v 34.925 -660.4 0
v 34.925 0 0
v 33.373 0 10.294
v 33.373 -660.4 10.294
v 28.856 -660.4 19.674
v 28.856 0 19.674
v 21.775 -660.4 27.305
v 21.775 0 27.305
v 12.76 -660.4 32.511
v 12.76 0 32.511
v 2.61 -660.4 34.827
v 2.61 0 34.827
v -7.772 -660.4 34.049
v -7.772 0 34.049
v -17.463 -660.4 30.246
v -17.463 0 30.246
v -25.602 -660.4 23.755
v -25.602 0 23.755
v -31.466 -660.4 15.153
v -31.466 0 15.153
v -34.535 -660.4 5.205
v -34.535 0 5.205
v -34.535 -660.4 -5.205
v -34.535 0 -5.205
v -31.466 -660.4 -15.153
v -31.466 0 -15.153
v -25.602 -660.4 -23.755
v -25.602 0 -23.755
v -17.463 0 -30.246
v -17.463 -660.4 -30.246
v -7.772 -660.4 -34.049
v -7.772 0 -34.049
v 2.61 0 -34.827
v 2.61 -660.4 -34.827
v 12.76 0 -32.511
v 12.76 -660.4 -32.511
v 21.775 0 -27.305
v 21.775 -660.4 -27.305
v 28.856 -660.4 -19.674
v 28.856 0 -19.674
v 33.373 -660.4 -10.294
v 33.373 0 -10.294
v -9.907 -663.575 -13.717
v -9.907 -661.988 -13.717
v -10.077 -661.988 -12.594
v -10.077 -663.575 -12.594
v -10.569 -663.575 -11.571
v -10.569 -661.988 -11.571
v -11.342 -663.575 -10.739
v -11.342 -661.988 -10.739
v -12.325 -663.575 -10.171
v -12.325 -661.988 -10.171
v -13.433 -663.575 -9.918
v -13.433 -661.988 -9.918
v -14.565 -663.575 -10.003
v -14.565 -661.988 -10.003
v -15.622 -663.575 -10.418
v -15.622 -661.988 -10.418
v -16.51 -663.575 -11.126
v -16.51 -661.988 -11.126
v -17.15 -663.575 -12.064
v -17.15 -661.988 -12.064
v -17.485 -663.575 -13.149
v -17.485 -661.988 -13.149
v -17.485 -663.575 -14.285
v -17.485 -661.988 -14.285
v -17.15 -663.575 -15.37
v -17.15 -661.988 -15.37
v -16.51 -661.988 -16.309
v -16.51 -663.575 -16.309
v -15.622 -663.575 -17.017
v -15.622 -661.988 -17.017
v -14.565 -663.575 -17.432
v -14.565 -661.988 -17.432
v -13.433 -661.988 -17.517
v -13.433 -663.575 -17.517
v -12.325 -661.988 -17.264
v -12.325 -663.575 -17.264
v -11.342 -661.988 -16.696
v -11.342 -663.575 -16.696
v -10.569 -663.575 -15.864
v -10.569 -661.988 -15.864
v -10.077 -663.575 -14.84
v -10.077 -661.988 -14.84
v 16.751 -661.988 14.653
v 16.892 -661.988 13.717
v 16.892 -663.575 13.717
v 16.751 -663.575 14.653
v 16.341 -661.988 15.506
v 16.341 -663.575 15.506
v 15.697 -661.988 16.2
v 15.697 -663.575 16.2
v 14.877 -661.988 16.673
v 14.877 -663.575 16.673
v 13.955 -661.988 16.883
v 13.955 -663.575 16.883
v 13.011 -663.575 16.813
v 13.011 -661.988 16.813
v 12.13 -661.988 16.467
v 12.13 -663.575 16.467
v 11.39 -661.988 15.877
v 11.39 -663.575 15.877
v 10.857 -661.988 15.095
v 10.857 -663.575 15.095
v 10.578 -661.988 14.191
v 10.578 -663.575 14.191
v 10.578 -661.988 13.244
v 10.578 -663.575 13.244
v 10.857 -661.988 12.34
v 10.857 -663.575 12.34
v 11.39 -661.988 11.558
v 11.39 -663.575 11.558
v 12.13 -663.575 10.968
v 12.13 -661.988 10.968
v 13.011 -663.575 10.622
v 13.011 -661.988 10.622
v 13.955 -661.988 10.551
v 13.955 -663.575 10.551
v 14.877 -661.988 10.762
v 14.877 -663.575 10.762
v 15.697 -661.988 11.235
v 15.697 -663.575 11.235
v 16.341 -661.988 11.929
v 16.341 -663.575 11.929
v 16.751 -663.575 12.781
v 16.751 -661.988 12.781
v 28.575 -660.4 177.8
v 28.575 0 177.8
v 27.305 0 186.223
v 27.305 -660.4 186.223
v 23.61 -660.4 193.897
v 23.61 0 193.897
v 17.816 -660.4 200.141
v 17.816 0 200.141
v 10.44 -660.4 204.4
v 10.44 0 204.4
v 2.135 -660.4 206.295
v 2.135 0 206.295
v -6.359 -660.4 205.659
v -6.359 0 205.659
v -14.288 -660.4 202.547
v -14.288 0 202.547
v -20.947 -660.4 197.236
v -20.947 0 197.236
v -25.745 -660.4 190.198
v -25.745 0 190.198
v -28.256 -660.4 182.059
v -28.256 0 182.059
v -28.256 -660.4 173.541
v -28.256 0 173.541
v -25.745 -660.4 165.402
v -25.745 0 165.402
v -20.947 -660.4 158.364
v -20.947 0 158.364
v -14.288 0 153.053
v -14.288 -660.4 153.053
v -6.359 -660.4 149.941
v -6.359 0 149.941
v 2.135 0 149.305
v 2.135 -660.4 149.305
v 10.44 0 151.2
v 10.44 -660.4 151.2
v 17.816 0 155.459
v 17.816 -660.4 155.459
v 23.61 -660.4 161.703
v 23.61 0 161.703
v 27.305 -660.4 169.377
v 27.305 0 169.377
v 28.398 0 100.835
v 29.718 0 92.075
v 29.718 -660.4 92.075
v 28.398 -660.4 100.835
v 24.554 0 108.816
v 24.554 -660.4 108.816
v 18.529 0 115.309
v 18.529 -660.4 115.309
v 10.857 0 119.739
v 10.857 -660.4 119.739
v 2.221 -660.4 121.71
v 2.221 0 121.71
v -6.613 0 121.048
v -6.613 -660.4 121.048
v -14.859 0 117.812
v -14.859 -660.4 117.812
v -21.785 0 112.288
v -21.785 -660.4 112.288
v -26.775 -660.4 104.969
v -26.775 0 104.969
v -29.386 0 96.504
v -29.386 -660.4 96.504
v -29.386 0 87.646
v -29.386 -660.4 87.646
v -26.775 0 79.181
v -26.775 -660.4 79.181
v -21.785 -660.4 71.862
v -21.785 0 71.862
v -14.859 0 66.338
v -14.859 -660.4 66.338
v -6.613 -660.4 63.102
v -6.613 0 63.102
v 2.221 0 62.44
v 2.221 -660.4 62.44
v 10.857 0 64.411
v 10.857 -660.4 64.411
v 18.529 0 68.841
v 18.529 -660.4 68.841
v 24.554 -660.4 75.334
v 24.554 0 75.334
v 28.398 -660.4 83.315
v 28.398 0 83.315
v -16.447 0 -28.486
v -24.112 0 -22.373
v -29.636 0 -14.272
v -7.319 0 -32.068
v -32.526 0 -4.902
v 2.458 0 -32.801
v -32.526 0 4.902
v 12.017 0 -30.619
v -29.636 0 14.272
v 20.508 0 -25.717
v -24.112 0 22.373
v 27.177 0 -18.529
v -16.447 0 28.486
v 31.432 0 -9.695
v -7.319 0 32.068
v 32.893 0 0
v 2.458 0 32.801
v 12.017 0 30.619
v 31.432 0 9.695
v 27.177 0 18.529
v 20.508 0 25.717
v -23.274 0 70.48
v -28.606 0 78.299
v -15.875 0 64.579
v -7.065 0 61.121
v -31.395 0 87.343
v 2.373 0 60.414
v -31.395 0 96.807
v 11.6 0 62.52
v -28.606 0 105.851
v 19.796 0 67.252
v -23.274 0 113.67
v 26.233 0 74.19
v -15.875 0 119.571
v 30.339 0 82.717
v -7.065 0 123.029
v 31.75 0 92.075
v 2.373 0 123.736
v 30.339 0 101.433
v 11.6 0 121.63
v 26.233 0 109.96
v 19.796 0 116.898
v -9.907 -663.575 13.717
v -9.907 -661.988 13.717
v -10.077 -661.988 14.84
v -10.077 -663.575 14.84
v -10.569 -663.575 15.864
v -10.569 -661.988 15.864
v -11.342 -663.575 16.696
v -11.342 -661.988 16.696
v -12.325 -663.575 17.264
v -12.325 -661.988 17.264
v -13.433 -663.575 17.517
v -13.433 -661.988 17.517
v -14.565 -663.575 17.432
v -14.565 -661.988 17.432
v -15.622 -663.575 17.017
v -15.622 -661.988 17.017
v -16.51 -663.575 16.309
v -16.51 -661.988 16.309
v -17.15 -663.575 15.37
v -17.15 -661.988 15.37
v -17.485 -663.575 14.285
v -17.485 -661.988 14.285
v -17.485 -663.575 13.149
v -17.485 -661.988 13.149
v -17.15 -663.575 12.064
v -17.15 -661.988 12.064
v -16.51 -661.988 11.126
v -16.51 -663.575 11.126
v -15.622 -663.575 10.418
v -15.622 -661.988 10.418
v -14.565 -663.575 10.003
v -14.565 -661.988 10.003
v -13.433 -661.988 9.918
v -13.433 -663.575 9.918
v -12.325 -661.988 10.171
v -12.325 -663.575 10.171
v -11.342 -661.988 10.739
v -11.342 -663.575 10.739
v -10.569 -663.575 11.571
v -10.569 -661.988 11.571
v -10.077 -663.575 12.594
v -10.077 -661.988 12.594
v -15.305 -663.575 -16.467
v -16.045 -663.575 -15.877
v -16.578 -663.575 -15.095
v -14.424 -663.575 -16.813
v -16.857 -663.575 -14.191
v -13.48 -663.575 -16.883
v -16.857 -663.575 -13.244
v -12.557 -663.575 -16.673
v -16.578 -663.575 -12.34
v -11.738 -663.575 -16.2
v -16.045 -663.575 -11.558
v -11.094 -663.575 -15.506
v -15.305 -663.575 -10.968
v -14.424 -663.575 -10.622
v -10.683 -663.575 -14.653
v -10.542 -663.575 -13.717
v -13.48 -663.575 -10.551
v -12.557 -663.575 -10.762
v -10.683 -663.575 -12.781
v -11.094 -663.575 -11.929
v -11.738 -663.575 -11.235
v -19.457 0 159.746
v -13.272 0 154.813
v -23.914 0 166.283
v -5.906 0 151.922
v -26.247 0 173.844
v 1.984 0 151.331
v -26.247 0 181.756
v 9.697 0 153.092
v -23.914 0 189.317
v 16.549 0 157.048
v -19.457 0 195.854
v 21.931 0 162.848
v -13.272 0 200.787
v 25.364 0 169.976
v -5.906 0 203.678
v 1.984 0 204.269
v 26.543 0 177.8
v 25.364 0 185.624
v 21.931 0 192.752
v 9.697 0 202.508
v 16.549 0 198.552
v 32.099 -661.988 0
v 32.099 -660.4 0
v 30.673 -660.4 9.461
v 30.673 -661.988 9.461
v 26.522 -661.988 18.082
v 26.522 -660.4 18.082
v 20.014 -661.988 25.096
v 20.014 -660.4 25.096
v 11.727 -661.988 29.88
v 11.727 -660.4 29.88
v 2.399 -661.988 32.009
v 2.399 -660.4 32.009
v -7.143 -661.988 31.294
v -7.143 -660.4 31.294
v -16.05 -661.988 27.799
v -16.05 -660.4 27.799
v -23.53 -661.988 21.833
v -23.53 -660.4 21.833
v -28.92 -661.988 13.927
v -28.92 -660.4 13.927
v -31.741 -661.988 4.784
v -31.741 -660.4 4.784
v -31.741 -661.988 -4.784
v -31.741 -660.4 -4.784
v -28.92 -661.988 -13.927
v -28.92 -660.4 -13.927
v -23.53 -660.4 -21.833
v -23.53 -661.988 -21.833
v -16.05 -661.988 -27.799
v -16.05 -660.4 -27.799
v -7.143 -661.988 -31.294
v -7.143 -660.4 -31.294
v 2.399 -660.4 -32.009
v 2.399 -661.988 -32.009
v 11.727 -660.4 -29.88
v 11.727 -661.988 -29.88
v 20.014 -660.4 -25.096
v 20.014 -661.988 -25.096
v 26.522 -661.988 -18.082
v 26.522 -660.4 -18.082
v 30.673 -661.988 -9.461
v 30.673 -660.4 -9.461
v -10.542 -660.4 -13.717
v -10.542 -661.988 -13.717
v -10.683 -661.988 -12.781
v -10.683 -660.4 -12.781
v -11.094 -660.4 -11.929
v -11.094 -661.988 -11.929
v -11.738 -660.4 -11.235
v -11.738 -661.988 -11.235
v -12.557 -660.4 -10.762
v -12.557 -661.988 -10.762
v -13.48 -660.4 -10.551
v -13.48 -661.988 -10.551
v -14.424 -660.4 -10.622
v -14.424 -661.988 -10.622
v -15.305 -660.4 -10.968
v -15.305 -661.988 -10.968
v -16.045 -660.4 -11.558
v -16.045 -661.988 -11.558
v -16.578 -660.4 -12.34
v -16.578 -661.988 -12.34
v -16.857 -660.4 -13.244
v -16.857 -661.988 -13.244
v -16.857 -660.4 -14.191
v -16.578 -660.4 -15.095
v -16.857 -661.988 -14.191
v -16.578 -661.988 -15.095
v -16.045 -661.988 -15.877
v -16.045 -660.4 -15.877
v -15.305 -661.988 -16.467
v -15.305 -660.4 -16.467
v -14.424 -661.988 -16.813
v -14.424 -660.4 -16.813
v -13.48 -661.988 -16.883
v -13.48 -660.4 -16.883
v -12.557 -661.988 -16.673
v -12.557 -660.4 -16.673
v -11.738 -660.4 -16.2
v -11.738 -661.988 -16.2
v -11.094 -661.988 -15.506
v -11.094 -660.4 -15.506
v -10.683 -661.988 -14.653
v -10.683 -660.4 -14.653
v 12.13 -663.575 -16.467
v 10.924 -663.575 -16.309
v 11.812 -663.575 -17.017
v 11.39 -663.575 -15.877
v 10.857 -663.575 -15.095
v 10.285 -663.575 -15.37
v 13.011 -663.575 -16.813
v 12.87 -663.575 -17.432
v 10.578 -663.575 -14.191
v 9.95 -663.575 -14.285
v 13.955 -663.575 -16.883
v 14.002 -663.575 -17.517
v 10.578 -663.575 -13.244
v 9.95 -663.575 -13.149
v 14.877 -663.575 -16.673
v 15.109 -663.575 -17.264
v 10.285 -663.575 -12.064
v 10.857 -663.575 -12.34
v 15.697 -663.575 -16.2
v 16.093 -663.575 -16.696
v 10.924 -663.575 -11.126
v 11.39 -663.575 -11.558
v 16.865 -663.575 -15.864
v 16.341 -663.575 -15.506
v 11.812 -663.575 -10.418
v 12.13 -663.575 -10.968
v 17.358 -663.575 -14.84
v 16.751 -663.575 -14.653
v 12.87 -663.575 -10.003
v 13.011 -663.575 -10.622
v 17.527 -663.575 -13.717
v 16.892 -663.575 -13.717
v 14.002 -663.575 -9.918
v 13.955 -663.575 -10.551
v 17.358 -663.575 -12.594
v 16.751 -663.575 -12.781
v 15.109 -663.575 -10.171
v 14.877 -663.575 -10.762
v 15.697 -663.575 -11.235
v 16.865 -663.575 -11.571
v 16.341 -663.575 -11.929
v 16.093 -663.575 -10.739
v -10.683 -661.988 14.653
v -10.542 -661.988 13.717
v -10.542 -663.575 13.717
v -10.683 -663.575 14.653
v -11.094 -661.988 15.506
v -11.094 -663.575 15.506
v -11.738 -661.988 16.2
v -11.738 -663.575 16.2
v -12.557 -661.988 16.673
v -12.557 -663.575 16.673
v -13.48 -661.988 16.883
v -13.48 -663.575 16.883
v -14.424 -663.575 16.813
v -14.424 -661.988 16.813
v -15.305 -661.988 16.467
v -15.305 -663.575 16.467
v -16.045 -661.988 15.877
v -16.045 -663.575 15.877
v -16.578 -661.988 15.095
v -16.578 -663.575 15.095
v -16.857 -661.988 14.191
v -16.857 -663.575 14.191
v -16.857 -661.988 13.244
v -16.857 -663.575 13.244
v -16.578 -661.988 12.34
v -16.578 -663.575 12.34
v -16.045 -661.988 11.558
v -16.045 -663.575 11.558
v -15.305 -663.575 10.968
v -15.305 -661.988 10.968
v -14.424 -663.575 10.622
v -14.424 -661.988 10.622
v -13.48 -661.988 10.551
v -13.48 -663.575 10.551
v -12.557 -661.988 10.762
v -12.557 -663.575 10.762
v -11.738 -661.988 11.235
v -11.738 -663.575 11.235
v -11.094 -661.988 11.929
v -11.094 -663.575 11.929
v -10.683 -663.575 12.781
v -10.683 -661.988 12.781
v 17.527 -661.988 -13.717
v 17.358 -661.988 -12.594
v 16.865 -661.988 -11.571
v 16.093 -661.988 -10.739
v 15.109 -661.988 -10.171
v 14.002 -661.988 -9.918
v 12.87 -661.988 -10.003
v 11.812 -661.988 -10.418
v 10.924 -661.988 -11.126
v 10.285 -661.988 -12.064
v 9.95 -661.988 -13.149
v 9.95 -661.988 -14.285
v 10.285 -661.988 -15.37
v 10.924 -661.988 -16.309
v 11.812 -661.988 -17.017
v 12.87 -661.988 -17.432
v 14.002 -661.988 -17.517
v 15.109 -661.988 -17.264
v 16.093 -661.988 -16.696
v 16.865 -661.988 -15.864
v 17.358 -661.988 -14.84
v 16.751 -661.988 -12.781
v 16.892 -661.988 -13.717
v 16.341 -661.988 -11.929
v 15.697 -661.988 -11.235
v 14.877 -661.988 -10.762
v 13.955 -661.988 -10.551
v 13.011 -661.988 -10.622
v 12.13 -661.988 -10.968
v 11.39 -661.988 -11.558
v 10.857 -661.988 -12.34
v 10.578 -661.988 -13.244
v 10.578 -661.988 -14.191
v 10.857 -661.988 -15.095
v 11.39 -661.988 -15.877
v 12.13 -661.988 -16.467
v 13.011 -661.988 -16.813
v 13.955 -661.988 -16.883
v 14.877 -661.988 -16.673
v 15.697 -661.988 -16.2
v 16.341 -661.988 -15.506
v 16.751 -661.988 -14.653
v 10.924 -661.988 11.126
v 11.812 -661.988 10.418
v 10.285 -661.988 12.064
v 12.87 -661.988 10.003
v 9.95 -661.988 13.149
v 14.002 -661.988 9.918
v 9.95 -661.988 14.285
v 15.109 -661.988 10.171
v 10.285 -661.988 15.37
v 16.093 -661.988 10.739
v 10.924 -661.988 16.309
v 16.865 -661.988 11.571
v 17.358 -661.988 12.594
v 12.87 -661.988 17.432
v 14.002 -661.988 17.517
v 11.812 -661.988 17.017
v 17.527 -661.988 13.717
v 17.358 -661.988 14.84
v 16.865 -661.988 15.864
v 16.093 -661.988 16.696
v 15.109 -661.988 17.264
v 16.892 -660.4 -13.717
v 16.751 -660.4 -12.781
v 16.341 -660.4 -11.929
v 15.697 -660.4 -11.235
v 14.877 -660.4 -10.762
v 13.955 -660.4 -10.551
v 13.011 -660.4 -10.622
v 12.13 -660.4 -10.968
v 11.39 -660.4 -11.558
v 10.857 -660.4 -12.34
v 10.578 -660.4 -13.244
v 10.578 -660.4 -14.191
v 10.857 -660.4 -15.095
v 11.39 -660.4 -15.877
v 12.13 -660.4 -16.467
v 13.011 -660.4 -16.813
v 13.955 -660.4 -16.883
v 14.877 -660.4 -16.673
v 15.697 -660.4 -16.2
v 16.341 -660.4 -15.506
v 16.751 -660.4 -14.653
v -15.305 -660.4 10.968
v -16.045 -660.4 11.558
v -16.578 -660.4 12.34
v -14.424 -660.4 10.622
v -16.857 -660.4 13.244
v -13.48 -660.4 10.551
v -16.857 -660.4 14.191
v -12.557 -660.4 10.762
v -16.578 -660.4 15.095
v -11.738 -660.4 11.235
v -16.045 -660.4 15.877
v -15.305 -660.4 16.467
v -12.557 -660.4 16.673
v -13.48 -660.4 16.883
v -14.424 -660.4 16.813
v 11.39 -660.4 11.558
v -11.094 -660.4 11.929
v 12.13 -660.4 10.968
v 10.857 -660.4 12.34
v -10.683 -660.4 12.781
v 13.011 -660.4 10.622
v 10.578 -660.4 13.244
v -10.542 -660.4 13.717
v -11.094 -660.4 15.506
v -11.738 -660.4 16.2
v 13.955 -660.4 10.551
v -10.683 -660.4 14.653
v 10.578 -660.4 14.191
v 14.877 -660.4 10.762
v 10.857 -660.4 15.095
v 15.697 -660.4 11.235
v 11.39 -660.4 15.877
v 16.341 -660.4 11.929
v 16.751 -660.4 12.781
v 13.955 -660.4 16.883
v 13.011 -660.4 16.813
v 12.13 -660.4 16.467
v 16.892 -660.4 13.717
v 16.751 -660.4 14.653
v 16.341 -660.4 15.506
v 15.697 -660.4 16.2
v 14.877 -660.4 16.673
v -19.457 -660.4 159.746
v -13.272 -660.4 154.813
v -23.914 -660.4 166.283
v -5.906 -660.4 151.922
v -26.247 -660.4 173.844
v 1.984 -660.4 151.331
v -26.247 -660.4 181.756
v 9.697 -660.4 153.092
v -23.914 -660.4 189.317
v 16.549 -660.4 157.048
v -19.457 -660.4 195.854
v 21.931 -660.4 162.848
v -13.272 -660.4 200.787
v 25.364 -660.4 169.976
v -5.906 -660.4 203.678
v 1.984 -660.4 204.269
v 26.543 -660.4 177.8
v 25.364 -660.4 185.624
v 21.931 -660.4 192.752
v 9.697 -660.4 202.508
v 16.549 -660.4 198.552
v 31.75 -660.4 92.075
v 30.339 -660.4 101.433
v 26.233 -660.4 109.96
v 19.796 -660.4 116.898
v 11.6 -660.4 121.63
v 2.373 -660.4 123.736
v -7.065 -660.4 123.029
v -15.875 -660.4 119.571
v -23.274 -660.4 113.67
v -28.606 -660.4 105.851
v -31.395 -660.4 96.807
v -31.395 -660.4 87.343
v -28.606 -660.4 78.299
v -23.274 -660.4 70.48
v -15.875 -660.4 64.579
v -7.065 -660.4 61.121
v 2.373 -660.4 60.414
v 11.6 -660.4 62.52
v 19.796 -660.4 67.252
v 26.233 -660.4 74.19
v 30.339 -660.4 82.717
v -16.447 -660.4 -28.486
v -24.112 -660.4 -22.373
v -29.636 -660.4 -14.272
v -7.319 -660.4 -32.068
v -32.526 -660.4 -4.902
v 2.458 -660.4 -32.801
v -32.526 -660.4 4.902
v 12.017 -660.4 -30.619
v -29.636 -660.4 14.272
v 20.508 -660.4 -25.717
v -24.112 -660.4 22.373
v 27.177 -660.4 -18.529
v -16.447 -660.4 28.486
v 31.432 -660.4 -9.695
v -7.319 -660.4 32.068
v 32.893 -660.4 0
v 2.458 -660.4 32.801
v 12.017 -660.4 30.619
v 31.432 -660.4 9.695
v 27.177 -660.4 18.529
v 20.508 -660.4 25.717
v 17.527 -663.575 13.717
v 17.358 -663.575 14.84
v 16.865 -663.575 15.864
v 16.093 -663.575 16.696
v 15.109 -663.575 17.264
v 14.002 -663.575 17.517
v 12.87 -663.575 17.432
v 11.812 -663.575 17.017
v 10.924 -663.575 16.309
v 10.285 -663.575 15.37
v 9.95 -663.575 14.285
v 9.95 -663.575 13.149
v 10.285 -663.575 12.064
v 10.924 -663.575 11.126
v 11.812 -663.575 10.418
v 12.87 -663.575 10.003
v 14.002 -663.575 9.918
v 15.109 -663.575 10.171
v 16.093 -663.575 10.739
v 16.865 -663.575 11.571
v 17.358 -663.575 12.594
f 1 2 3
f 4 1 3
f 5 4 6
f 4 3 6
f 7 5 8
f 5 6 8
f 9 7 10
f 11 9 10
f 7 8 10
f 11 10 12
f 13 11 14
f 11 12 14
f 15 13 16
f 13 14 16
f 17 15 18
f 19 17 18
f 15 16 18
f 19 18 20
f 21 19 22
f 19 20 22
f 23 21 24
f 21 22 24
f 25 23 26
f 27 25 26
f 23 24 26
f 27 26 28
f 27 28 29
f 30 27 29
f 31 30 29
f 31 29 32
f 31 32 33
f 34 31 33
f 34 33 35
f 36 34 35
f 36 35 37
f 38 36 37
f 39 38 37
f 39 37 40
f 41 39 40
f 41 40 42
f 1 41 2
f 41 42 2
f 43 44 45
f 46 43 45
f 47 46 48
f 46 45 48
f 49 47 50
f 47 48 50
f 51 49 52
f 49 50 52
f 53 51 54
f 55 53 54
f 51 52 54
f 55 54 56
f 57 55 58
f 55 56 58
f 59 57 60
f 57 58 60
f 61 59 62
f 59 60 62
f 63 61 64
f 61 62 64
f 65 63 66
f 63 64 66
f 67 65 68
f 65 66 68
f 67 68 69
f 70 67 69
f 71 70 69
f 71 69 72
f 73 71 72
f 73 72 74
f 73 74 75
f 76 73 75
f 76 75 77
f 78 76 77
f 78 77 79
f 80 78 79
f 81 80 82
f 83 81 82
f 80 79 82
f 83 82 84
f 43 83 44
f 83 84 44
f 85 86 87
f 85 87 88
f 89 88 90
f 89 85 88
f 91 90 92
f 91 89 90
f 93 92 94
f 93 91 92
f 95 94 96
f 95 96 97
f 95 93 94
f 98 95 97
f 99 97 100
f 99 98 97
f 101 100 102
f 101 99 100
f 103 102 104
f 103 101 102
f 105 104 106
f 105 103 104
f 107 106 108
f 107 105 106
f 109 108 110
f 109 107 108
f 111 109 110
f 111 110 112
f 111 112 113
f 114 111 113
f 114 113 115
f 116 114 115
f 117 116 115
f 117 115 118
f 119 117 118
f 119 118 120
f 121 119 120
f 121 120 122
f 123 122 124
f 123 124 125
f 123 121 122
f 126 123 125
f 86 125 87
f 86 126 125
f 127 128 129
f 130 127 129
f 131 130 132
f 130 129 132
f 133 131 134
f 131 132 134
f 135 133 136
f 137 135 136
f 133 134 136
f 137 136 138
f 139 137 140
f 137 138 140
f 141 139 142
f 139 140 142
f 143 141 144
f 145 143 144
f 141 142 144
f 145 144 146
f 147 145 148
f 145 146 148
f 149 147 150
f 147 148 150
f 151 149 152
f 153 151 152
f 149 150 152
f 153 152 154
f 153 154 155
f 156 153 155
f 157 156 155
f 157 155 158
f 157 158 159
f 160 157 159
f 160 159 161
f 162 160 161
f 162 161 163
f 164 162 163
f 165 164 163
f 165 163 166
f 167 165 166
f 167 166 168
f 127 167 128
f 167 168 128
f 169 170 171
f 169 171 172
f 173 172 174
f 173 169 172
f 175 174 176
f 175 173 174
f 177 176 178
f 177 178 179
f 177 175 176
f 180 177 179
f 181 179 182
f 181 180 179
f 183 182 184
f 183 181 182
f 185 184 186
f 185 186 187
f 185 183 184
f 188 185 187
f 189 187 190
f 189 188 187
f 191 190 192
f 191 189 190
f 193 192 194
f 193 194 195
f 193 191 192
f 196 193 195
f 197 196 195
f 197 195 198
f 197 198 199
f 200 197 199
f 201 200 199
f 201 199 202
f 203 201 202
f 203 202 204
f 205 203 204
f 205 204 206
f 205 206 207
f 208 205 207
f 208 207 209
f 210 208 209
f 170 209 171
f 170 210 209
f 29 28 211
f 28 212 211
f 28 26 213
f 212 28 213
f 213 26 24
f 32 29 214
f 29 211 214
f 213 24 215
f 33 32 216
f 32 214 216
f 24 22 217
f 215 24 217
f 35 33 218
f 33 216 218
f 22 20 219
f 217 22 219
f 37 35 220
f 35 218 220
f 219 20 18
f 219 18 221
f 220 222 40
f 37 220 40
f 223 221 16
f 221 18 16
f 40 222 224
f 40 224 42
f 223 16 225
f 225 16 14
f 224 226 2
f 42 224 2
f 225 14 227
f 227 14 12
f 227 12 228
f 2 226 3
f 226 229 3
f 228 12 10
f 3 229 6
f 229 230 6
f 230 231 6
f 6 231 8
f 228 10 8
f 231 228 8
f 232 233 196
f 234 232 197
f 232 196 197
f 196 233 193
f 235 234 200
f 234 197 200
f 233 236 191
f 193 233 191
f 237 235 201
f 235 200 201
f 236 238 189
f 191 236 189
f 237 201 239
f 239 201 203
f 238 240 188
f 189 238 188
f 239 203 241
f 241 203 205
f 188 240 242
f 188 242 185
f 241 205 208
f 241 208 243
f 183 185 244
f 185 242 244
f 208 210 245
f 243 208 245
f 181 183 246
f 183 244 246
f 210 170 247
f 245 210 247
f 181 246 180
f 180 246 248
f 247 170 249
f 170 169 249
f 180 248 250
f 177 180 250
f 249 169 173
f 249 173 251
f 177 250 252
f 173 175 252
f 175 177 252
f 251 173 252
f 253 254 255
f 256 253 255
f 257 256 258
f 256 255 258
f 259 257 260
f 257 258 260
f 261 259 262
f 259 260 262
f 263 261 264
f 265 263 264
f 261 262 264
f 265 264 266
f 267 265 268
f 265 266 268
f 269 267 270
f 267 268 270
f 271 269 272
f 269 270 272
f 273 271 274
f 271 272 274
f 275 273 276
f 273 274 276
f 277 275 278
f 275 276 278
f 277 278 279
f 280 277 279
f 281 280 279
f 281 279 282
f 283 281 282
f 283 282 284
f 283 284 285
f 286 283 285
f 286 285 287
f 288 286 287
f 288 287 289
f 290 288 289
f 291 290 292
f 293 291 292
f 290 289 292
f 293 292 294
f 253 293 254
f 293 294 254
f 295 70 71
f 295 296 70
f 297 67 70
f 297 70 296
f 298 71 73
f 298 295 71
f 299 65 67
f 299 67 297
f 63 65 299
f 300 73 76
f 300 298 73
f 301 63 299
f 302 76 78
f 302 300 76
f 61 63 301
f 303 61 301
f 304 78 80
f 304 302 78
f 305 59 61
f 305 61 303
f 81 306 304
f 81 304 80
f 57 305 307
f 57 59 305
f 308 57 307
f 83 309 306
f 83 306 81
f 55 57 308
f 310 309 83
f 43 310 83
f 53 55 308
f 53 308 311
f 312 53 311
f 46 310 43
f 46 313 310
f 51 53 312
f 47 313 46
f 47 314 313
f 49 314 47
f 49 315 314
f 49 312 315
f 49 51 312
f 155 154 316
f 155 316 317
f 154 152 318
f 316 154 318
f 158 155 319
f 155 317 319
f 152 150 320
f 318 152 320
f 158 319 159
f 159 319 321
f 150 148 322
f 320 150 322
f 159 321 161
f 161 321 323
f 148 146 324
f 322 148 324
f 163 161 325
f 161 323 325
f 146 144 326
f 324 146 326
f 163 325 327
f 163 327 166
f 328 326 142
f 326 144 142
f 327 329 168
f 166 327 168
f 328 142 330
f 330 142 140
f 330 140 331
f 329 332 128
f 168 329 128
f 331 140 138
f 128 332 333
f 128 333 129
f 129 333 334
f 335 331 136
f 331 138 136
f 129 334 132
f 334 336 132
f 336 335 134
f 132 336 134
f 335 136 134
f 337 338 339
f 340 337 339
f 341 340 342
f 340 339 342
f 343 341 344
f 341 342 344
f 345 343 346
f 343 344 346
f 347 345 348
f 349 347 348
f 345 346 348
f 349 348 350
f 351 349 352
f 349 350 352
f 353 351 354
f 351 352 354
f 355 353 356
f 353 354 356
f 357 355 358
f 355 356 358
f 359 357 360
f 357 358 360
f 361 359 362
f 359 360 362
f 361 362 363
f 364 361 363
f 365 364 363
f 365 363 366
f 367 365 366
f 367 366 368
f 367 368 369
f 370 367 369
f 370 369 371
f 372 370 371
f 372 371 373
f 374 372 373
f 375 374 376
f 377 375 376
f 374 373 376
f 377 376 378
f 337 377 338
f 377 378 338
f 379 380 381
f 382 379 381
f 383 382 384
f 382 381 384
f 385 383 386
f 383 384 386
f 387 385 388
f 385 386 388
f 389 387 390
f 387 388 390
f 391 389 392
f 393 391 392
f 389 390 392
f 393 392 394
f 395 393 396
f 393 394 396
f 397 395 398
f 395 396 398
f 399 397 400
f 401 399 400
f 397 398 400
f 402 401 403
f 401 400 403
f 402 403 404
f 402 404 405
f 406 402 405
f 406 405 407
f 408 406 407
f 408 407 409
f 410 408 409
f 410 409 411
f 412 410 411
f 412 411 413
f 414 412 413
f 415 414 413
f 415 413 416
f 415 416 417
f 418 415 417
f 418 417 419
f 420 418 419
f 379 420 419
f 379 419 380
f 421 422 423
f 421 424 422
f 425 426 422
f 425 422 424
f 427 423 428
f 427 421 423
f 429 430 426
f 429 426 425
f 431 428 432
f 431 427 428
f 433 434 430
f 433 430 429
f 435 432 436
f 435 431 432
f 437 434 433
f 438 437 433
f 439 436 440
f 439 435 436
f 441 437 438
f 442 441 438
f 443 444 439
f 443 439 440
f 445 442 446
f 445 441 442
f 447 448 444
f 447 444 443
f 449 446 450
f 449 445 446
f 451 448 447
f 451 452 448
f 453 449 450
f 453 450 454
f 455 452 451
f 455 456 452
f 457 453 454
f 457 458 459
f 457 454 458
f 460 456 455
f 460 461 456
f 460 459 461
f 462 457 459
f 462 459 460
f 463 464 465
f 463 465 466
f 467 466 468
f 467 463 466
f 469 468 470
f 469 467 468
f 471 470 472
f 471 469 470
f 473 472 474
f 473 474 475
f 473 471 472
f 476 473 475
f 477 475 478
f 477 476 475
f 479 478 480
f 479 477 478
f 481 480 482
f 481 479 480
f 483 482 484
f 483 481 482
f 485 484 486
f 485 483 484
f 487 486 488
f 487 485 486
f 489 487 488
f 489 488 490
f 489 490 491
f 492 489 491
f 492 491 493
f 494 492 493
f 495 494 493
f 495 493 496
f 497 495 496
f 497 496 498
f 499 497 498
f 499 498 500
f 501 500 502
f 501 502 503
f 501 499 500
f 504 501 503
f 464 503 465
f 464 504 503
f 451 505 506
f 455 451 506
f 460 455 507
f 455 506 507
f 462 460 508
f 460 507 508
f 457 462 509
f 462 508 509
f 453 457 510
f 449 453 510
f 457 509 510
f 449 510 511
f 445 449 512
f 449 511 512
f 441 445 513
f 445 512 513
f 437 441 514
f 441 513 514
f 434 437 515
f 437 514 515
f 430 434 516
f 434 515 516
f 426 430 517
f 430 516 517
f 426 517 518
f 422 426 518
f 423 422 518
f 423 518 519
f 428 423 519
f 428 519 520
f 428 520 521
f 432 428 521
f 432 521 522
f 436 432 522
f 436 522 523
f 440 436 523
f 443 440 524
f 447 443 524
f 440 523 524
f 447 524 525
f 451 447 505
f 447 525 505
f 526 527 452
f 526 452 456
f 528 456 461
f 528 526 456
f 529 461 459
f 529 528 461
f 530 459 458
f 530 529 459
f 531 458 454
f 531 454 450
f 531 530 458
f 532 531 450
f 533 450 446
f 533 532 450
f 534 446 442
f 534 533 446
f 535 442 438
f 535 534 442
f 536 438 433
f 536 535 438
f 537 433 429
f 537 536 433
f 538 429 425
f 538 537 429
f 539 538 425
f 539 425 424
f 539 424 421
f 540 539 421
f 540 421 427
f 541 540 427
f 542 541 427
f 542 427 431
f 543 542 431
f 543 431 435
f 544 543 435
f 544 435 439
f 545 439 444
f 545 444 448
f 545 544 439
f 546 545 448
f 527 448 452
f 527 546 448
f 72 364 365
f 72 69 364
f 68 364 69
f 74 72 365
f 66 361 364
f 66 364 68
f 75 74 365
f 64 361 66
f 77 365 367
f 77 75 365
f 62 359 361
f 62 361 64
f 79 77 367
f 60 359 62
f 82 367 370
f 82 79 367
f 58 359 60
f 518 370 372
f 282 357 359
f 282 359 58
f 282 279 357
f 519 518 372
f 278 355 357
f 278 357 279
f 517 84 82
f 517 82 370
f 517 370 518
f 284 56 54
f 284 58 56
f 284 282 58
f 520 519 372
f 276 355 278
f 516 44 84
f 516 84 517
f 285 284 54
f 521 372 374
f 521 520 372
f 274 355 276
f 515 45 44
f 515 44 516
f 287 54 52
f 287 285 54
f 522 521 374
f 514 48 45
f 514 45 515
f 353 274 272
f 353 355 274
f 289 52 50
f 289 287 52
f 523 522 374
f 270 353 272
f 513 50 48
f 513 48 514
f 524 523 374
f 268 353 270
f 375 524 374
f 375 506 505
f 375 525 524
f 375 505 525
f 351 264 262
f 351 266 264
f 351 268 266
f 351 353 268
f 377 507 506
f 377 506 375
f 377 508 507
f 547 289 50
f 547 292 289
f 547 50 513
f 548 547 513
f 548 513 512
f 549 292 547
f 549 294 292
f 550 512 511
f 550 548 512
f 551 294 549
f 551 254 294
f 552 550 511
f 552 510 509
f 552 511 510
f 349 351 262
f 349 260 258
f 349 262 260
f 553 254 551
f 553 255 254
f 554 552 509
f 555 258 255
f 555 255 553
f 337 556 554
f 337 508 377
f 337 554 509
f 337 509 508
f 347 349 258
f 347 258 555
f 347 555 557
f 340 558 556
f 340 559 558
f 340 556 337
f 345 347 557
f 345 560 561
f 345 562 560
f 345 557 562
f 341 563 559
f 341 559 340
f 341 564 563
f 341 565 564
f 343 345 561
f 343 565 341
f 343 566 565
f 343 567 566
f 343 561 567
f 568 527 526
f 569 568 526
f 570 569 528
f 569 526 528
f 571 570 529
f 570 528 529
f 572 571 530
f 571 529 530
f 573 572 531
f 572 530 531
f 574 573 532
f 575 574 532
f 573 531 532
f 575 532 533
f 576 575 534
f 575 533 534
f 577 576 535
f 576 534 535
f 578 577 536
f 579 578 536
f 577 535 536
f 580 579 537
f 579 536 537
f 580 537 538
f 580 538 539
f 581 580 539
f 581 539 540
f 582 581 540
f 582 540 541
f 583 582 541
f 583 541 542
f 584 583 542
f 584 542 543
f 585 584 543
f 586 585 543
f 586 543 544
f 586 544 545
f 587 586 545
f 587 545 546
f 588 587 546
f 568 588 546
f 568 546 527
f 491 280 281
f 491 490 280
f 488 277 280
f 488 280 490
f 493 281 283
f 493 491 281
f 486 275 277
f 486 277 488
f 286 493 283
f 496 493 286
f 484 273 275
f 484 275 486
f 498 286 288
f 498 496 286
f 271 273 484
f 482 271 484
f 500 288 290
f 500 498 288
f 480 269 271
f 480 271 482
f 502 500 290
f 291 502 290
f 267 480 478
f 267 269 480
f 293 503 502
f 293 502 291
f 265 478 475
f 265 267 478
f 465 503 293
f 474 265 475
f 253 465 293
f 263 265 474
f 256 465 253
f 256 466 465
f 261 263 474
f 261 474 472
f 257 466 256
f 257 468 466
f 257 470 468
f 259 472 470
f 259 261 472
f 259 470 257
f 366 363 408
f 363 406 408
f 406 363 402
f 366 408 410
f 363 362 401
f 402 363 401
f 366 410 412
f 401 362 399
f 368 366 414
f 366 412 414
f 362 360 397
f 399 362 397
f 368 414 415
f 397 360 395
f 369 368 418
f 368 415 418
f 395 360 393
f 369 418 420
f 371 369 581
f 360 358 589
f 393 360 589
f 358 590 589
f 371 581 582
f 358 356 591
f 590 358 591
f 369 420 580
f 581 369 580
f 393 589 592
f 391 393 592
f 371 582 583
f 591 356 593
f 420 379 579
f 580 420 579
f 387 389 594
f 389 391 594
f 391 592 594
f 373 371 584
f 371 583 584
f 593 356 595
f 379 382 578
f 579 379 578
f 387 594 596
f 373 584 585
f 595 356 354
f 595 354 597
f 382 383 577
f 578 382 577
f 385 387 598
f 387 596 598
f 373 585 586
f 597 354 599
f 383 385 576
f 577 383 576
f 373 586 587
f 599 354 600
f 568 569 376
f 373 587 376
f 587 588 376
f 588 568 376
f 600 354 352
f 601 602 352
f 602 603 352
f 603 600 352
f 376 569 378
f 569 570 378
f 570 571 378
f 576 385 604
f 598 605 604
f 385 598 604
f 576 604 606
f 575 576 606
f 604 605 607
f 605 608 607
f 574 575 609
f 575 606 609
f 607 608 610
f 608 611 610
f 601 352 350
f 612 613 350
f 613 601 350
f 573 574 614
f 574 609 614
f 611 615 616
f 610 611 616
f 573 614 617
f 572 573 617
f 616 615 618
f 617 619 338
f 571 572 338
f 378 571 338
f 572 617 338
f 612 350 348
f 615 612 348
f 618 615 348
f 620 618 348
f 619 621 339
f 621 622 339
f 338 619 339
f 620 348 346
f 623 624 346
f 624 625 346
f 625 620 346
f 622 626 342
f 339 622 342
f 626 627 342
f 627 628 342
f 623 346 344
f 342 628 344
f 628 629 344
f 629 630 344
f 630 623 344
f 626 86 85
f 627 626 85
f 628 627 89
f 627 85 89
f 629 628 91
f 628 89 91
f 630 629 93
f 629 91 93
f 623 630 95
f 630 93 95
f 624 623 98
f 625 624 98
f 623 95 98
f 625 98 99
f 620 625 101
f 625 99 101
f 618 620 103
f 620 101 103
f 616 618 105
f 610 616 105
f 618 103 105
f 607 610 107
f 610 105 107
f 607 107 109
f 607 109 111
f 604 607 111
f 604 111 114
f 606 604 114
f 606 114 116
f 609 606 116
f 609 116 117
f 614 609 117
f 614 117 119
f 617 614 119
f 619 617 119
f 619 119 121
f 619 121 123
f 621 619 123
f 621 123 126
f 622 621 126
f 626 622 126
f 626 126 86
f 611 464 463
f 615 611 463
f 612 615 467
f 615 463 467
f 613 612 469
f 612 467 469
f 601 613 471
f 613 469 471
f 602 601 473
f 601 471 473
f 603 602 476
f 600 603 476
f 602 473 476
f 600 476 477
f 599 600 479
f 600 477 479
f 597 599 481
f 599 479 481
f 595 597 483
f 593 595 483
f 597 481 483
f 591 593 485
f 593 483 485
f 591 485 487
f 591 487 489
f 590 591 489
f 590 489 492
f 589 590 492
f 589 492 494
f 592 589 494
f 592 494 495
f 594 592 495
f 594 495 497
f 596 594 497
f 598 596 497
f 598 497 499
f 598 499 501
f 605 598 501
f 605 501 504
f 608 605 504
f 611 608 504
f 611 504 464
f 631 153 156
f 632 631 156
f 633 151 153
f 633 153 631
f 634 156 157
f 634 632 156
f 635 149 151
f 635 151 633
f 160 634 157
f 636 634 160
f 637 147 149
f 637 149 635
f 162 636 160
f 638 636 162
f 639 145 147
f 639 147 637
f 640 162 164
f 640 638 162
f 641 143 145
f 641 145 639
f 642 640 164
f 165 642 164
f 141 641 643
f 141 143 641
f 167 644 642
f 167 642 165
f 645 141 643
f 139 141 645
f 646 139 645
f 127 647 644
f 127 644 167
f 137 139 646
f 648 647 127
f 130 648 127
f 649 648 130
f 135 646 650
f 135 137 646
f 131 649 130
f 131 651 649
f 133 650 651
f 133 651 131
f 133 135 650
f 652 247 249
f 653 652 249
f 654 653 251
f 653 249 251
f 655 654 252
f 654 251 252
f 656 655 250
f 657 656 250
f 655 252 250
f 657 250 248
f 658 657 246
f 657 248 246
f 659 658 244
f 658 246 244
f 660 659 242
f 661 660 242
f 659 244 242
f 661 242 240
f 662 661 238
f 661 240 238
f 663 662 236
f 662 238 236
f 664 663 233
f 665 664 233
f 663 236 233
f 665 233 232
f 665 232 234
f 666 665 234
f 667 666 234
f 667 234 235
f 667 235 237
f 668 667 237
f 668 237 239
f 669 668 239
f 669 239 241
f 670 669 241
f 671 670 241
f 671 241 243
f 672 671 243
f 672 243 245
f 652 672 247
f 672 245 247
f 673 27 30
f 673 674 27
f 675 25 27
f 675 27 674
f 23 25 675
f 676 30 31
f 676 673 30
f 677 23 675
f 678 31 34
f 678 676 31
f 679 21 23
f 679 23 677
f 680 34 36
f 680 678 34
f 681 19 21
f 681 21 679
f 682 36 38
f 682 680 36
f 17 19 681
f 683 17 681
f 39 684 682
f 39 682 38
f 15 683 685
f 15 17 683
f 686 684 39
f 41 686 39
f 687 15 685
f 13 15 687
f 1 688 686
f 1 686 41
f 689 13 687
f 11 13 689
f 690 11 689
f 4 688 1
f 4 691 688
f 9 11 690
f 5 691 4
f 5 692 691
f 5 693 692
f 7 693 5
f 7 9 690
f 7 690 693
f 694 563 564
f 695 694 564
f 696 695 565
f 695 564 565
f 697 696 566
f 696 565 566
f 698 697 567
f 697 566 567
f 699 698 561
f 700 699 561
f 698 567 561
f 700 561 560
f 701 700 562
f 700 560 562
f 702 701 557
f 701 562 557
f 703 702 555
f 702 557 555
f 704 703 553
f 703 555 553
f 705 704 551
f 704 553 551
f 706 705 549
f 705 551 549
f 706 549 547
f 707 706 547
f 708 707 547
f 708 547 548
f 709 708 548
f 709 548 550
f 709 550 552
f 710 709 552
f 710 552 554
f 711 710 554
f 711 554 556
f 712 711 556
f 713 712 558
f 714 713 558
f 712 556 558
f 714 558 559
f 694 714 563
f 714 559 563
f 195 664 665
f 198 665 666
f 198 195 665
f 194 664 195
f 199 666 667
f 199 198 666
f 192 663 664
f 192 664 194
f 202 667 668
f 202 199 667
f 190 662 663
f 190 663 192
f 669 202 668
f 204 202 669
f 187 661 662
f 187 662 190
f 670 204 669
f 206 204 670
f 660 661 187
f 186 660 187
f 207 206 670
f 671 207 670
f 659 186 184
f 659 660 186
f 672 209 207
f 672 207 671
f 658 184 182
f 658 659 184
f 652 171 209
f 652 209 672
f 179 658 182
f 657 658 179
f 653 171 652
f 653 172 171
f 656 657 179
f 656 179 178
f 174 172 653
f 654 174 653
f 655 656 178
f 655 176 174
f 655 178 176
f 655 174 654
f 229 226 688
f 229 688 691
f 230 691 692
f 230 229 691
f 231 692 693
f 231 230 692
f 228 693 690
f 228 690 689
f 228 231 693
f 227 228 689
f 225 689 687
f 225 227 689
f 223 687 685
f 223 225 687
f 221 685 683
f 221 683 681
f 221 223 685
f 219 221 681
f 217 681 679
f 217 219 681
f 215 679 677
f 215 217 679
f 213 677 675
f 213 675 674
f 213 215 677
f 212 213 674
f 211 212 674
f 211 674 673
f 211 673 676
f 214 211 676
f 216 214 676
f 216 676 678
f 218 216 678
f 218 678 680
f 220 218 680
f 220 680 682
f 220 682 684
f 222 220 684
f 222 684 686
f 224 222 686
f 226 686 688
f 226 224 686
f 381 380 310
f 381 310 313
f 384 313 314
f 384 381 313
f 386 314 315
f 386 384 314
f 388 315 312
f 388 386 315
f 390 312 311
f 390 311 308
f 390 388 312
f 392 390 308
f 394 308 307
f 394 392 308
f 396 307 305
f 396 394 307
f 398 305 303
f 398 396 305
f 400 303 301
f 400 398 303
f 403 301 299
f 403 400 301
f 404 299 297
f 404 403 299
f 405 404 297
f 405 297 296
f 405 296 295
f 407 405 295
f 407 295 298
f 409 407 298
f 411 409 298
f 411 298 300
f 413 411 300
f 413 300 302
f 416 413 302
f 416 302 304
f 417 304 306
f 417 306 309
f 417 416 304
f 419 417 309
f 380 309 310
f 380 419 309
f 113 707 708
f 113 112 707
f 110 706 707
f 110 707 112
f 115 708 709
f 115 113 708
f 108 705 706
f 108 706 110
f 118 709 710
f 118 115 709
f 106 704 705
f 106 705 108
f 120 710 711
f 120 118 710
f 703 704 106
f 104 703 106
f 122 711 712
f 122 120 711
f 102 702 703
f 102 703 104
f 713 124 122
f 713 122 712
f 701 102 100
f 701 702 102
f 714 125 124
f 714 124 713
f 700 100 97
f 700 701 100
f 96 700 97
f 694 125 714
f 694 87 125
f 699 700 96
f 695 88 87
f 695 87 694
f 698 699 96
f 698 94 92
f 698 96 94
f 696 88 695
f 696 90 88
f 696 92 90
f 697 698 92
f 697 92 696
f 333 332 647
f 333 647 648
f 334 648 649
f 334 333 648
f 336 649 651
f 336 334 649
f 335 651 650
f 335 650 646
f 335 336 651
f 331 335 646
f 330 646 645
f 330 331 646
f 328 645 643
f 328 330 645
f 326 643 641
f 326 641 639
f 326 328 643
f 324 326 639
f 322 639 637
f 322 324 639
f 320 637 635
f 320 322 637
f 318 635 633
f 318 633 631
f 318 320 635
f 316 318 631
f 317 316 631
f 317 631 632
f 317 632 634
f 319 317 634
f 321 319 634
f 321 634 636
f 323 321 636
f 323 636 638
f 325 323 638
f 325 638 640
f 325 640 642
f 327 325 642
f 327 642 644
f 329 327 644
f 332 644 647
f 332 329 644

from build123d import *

# Parameters (mm, degrees)
F0_R     = 28.575
F0_R_2   = 26.543
F0_R_3   = 31.75
F0_R_4   = 29.718
F0_R_5   = 34.925
F0_R_6   = 32.893
F1_DEPTH = 660.4
F2_R     = 32.09925
F3_DEPTH = 1.5875
F4_R     = 3.81
F4_R_2   = 3.175
F5_DEPTH = 1.5875
F6_DEPTH = 661.9885


with BuildPart() as f1:
    # F0 (on Front) → F1 (new body)
    with BuildSketch(Plane.XZ):
        with Locations((0, 177.8)):
            Circle(F0_R)
        with Locations((0, 177.8)):
            Circle(F0_R_2, mode=Mode.SUBTRACT)
        with Locations((0, 92.075)):
            Circle(F0_R_3)
        with Locations((0, 92.075)):
            Circle(F0_R_4, mode=Mode.SUBTRACT)
        Circle(F0_R_5)
        Circle(F0_R_6, mode=Mode.SUBTRACT)
    extrude(amount=F1_DEPTH)


with BuildPart() as f3:
    # F2 (on face) → F3 (new body)
    with BuildSketch(Plane.XZ.offset(660.4)):
        Circle(F2_R)
    extrude(amount=F3_DEPTH)

    # F4 (on face) → F5 (join)
    with BuildSketch(Plane.XZ.offset(661.9875)):
        with Locations((-13.717341, 13.717341)):
            Circle(F4_R)
        with Locations((-13.717341, 13.717341)):
            Circle(F4_R_2, mode=Mode.SUBTRACT)
        with Locations((13.717341, 13.717341)):
            Circle(F4_R)
        with Locations((13.717341, 13.717341)):
            Circle(F4_R_2, mode=Mode.SUBTRACT)
        with Locations((13.717341, -13.717341)):
            Circle(F4_R)
        with Locations((13.717341, -13.717341)):
            Circle(F4_R_2, mode=Mode.SUBTRACT)
        with Locations((-13.717341, -13.717341)):
            Circle(F4_R)
        with Locations((-13.717341, -13.717341)):
            Circle(F4_R_2, mode=Mode.SUBTRACT)
    extrude(amount=F5_DEPTH)

    # F4 (on face) → F6 (cut, through all)
    with BuildSketch(Plane.XZ.offset(661.9875)):
        with Locations((-13.717341, 13.717341)):
            Circle(F4_R_2)
        with Locations((13.717341, 13.717341)):
            Circle(F4_R_2)
        with Locations((13.717341, -13.717341)):
            Circle(F4_R_2)
        with Locations((-13.717341, -13.717341)):
            Circle(F4_R_2)
    extrude(amount=-F6_DEPTH, mode=Mode.SUBTRACT)


solid = Compound([f1.part, f3.part])
